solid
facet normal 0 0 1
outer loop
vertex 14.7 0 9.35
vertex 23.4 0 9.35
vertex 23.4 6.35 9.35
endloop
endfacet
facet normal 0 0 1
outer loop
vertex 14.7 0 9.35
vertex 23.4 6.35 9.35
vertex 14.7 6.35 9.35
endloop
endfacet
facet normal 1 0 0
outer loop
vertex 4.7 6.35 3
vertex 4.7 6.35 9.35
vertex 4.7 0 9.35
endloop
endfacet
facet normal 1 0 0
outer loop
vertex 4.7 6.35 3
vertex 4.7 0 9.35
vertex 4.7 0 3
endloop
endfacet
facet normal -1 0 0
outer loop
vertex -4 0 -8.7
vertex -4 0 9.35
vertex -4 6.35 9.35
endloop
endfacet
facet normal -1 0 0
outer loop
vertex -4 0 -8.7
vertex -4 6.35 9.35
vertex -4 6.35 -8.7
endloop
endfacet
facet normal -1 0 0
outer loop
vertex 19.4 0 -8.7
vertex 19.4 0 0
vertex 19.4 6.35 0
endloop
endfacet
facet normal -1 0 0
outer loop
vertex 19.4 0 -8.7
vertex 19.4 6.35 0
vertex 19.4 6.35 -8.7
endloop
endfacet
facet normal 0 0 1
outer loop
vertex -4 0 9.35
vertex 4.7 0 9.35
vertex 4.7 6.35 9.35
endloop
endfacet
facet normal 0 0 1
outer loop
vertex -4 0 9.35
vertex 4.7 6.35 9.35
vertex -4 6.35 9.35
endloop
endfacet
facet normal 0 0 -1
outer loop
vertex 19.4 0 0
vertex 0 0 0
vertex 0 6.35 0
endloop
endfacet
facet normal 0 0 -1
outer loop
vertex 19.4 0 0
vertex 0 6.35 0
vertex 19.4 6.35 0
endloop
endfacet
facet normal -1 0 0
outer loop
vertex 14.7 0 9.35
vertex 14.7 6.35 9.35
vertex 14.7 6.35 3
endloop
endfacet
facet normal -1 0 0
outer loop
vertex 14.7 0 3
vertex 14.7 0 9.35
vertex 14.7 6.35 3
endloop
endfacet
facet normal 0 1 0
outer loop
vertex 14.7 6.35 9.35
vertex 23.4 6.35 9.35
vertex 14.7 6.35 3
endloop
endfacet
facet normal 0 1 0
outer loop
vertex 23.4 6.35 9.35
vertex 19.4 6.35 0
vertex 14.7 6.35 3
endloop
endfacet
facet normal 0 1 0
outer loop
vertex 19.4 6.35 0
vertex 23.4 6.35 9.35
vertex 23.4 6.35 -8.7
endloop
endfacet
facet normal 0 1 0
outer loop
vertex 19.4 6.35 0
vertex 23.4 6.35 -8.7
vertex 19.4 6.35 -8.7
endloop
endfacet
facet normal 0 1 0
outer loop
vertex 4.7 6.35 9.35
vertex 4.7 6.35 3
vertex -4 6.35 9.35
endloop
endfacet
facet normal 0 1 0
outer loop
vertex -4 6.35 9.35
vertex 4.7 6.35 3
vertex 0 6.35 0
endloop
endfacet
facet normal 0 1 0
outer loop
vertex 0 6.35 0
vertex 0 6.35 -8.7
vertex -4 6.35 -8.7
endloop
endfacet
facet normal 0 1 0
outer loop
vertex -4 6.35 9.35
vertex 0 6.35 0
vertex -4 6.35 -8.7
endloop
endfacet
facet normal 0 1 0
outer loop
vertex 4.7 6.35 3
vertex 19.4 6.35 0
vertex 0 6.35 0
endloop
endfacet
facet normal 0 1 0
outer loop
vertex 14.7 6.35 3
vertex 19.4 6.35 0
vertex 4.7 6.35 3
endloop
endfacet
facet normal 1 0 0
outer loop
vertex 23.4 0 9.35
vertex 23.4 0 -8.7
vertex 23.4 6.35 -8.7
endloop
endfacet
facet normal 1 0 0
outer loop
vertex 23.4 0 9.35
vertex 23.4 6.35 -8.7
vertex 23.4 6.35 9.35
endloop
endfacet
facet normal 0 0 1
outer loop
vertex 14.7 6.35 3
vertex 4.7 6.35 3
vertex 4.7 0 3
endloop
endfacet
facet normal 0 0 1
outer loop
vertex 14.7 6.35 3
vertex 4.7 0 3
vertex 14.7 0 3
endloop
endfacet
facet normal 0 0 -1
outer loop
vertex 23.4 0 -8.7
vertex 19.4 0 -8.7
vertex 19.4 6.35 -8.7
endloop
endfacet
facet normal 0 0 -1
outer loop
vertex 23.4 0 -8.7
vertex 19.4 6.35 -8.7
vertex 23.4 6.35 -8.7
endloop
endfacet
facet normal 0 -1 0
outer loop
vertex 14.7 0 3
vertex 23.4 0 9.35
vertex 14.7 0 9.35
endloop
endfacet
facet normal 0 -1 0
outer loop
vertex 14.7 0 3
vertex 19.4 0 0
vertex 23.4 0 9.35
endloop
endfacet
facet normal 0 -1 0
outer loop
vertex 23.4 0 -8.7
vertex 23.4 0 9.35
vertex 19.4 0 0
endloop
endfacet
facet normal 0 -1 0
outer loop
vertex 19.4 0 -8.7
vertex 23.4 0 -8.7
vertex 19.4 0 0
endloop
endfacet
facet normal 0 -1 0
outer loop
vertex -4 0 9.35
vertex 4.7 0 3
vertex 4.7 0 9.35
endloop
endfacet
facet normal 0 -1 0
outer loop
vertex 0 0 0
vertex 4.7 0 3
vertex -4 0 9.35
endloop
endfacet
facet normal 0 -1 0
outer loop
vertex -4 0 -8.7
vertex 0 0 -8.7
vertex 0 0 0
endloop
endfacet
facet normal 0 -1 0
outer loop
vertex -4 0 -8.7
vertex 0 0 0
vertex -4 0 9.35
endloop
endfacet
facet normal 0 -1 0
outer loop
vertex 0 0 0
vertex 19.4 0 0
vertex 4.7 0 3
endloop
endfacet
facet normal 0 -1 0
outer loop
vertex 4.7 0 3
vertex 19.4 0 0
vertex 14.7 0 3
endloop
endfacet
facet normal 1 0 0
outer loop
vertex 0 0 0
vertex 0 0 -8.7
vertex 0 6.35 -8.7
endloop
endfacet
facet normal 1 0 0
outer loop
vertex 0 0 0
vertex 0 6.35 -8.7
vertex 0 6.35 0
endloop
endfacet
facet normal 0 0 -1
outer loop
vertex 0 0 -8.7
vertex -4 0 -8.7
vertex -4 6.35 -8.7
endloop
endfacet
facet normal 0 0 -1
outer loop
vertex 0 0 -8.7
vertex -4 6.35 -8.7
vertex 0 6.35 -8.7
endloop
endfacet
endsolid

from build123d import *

# Parameters (mm, degrees)
BOSS_EXTRUDE1_DEPTH = 6.35
CUT_EXTRUDE1_REACH  = 8.35
SKETCH2_W           = 10
SKETCH2_H           = 6.35


with BuildPart() as part:
    # Sketch1 → Boss-Extrude1 (new body)
    with BuildSketch(Plane(origin=(0, 0, 0), x_dir=(1, 0, 0), z_dir=(0, 1, 0))):
        Polygon((0, 0), (19.4, 0), (19.4, 8.7), (23.4, 8.7), (23.4, -9.35), (-4, -9.35), (-4, 8.7), (0, 8.7), align=None)
    extrude(amount=BOSS_EXTRUDE1_DEPTH)

    # Sketch2 → Cut-Extrude1 (cut, up to next)
    with BuildSketch(Plane(origin=(0, 6.35, 0), x_dir=(1, 0, 0), z_dir=(0, 1, 0)), mode=Mode.PRIVATE) as cut_extrude1_sk1:
        with Locations((9.7, -6.175)):
            Rectangle(SKETCH2_W, SKETCH2_H)
    cut_extrude1_tool1 = extrude(cut_extrude1_sk1.sketch, amount=-CUT_EXTRUDE1_REACH, mode=Mode.PRIVATE) & part.part
    add(cut_extrude1_tool1.solids().sort_by_distance((9.7, 6.35, 6.175))[0], mode=Mode.SUBTRACT)


solid = part.part
